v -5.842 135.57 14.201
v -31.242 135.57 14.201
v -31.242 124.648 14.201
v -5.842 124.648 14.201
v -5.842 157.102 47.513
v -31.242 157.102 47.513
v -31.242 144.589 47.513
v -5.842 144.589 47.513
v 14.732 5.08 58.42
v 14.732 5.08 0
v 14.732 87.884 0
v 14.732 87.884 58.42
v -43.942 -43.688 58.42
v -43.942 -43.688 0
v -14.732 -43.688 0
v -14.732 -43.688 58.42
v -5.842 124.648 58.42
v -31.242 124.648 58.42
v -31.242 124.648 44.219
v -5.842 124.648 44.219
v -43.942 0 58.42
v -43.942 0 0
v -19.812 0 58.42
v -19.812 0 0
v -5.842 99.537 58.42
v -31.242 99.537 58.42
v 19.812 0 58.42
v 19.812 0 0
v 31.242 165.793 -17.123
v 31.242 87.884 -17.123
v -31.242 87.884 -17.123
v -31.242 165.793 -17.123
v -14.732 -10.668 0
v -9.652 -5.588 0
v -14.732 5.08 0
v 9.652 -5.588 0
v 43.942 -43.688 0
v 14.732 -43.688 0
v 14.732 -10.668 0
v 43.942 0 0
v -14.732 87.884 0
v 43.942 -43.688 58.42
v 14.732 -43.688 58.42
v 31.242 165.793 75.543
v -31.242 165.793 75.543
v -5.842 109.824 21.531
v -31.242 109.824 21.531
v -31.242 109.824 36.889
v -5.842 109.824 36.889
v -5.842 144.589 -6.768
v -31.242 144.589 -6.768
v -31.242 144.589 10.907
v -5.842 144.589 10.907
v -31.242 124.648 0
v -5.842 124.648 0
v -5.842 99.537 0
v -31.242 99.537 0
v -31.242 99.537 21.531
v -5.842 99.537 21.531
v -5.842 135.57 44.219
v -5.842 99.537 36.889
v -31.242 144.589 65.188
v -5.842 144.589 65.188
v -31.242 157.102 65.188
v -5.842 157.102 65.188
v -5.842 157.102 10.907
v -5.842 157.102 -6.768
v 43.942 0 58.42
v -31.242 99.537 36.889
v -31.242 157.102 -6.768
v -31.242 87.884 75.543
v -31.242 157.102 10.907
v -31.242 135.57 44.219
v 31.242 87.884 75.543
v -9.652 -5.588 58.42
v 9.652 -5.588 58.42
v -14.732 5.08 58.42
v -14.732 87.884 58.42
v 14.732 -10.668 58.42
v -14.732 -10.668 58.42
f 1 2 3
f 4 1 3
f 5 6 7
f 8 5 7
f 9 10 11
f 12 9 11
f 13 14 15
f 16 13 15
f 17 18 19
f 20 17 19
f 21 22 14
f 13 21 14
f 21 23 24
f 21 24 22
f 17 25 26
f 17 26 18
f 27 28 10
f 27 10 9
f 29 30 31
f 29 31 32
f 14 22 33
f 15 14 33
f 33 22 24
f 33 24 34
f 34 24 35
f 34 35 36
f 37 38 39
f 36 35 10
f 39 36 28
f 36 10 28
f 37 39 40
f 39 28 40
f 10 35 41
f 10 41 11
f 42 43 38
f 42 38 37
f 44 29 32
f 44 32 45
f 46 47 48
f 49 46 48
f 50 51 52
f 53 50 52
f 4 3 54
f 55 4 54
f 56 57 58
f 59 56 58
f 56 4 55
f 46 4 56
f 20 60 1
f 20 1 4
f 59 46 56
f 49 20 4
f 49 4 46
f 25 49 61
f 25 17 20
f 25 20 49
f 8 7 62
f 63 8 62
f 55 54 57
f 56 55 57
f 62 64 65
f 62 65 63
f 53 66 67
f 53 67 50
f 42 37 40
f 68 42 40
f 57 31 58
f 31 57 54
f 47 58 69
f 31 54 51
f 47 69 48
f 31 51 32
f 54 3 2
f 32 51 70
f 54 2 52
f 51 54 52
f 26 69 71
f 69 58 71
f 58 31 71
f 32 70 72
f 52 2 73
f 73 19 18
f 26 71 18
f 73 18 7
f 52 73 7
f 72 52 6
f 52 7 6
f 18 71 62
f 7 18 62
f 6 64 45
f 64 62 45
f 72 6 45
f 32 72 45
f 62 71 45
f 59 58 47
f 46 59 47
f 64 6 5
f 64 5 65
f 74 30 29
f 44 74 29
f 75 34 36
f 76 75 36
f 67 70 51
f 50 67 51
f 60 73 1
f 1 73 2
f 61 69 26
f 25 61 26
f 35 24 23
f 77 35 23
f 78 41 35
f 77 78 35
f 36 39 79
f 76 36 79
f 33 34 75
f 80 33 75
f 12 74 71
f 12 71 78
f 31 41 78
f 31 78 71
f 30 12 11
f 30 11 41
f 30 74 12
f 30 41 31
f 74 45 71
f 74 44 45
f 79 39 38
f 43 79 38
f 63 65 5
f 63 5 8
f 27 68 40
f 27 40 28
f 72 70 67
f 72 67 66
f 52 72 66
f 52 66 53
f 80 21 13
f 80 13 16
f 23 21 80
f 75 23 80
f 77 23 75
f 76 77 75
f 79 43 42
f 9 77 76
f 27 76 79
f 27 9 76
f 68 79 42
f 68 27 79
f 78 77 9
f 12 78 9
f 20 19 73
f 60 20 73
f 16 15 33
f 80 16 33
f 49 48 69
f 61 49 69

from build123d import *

# Parameters (mm, degrees)
F1_DEPTH = 58.42
F3_DEPTH = 31.242
F4_W     = 12.51252
F4_H     = 17.674709
F5_DEPTH = 25.4
F6_SIZE  = 5.08


with BuildPart() as f1:
    # F0 (on Top) → F1 (new body)
    with BuildSketch(Plane.XY):
        Polygon((-43.942, 0), (-43.942, -43.688), (-14.732, -43.688), (-14.732, -5.588), (0, -5.588), (14.732, -5.588), (14.732, -43.688), (43.942, -43.688), (43.942, 0), (14.732, 0), (14.732, 87.884), (0, 87.884), (-14.732, 87.884), (-14.732, 0), align=None)
    extrude(amount=F1_DEPTH)

    # F2 (on Right) → F3 (join, symmetric)
    with BuildSketch(Plane.YZ):
        Polygon((87.884, 75.542652), (87.884, 58.42), (87.884, 54.577157), (87.884, 0), (87.884, -17.122652), (165.792628, -17.122652), (165.792628, 75.542652), align=None)
    extrude(amount=F3_DEPTH, both=True)

    # F4 (on face) → F5 (cut)
    with BuildSketch(Plane(origin=(-31.242, 0, 0), x_dir=(0, -1, 0), z_dir=(-1, 0, 0))):
        with Locations((-150.845341, 2.069356)):
            Rectangle(F4_W, F4_H)
        Polygon((-135.569647, 44.218883), (-135.569647, 29.21), (-135.569647, 14.201117), (-124.647684, 14.201117), (-124.647684, 0), (-99.536583, 0), (-99.536583, 21.531122), (-109.823912, 21.531122), (-109.823912, 29.21), (-109.823912, 36.888878), (-99.536583, 36.888878), (-99.536583, 58.42), (-124.647684, 58.42), (-124.647684, 44.218883), align=None)
        with Locations((-150.845341, 56.350644)):
            Rectangle(F4_W, F4_H)
    extrude(amount=-F5_DEPTH, mode=Mode.SUBTRACT)

    # F6
    f6_edges = [f1.edges().sort_by_distance(p)[0] for p in [
        (14.732, -5.588, 29.21),
        (-14.732, -5.588, 29.21),
        (-14.732, 0, 29.21),
        (14.732, 0, 29.21),
    ]]
    chamfer(f6_edges, length=F6_SIZE)


solid = f1.part
